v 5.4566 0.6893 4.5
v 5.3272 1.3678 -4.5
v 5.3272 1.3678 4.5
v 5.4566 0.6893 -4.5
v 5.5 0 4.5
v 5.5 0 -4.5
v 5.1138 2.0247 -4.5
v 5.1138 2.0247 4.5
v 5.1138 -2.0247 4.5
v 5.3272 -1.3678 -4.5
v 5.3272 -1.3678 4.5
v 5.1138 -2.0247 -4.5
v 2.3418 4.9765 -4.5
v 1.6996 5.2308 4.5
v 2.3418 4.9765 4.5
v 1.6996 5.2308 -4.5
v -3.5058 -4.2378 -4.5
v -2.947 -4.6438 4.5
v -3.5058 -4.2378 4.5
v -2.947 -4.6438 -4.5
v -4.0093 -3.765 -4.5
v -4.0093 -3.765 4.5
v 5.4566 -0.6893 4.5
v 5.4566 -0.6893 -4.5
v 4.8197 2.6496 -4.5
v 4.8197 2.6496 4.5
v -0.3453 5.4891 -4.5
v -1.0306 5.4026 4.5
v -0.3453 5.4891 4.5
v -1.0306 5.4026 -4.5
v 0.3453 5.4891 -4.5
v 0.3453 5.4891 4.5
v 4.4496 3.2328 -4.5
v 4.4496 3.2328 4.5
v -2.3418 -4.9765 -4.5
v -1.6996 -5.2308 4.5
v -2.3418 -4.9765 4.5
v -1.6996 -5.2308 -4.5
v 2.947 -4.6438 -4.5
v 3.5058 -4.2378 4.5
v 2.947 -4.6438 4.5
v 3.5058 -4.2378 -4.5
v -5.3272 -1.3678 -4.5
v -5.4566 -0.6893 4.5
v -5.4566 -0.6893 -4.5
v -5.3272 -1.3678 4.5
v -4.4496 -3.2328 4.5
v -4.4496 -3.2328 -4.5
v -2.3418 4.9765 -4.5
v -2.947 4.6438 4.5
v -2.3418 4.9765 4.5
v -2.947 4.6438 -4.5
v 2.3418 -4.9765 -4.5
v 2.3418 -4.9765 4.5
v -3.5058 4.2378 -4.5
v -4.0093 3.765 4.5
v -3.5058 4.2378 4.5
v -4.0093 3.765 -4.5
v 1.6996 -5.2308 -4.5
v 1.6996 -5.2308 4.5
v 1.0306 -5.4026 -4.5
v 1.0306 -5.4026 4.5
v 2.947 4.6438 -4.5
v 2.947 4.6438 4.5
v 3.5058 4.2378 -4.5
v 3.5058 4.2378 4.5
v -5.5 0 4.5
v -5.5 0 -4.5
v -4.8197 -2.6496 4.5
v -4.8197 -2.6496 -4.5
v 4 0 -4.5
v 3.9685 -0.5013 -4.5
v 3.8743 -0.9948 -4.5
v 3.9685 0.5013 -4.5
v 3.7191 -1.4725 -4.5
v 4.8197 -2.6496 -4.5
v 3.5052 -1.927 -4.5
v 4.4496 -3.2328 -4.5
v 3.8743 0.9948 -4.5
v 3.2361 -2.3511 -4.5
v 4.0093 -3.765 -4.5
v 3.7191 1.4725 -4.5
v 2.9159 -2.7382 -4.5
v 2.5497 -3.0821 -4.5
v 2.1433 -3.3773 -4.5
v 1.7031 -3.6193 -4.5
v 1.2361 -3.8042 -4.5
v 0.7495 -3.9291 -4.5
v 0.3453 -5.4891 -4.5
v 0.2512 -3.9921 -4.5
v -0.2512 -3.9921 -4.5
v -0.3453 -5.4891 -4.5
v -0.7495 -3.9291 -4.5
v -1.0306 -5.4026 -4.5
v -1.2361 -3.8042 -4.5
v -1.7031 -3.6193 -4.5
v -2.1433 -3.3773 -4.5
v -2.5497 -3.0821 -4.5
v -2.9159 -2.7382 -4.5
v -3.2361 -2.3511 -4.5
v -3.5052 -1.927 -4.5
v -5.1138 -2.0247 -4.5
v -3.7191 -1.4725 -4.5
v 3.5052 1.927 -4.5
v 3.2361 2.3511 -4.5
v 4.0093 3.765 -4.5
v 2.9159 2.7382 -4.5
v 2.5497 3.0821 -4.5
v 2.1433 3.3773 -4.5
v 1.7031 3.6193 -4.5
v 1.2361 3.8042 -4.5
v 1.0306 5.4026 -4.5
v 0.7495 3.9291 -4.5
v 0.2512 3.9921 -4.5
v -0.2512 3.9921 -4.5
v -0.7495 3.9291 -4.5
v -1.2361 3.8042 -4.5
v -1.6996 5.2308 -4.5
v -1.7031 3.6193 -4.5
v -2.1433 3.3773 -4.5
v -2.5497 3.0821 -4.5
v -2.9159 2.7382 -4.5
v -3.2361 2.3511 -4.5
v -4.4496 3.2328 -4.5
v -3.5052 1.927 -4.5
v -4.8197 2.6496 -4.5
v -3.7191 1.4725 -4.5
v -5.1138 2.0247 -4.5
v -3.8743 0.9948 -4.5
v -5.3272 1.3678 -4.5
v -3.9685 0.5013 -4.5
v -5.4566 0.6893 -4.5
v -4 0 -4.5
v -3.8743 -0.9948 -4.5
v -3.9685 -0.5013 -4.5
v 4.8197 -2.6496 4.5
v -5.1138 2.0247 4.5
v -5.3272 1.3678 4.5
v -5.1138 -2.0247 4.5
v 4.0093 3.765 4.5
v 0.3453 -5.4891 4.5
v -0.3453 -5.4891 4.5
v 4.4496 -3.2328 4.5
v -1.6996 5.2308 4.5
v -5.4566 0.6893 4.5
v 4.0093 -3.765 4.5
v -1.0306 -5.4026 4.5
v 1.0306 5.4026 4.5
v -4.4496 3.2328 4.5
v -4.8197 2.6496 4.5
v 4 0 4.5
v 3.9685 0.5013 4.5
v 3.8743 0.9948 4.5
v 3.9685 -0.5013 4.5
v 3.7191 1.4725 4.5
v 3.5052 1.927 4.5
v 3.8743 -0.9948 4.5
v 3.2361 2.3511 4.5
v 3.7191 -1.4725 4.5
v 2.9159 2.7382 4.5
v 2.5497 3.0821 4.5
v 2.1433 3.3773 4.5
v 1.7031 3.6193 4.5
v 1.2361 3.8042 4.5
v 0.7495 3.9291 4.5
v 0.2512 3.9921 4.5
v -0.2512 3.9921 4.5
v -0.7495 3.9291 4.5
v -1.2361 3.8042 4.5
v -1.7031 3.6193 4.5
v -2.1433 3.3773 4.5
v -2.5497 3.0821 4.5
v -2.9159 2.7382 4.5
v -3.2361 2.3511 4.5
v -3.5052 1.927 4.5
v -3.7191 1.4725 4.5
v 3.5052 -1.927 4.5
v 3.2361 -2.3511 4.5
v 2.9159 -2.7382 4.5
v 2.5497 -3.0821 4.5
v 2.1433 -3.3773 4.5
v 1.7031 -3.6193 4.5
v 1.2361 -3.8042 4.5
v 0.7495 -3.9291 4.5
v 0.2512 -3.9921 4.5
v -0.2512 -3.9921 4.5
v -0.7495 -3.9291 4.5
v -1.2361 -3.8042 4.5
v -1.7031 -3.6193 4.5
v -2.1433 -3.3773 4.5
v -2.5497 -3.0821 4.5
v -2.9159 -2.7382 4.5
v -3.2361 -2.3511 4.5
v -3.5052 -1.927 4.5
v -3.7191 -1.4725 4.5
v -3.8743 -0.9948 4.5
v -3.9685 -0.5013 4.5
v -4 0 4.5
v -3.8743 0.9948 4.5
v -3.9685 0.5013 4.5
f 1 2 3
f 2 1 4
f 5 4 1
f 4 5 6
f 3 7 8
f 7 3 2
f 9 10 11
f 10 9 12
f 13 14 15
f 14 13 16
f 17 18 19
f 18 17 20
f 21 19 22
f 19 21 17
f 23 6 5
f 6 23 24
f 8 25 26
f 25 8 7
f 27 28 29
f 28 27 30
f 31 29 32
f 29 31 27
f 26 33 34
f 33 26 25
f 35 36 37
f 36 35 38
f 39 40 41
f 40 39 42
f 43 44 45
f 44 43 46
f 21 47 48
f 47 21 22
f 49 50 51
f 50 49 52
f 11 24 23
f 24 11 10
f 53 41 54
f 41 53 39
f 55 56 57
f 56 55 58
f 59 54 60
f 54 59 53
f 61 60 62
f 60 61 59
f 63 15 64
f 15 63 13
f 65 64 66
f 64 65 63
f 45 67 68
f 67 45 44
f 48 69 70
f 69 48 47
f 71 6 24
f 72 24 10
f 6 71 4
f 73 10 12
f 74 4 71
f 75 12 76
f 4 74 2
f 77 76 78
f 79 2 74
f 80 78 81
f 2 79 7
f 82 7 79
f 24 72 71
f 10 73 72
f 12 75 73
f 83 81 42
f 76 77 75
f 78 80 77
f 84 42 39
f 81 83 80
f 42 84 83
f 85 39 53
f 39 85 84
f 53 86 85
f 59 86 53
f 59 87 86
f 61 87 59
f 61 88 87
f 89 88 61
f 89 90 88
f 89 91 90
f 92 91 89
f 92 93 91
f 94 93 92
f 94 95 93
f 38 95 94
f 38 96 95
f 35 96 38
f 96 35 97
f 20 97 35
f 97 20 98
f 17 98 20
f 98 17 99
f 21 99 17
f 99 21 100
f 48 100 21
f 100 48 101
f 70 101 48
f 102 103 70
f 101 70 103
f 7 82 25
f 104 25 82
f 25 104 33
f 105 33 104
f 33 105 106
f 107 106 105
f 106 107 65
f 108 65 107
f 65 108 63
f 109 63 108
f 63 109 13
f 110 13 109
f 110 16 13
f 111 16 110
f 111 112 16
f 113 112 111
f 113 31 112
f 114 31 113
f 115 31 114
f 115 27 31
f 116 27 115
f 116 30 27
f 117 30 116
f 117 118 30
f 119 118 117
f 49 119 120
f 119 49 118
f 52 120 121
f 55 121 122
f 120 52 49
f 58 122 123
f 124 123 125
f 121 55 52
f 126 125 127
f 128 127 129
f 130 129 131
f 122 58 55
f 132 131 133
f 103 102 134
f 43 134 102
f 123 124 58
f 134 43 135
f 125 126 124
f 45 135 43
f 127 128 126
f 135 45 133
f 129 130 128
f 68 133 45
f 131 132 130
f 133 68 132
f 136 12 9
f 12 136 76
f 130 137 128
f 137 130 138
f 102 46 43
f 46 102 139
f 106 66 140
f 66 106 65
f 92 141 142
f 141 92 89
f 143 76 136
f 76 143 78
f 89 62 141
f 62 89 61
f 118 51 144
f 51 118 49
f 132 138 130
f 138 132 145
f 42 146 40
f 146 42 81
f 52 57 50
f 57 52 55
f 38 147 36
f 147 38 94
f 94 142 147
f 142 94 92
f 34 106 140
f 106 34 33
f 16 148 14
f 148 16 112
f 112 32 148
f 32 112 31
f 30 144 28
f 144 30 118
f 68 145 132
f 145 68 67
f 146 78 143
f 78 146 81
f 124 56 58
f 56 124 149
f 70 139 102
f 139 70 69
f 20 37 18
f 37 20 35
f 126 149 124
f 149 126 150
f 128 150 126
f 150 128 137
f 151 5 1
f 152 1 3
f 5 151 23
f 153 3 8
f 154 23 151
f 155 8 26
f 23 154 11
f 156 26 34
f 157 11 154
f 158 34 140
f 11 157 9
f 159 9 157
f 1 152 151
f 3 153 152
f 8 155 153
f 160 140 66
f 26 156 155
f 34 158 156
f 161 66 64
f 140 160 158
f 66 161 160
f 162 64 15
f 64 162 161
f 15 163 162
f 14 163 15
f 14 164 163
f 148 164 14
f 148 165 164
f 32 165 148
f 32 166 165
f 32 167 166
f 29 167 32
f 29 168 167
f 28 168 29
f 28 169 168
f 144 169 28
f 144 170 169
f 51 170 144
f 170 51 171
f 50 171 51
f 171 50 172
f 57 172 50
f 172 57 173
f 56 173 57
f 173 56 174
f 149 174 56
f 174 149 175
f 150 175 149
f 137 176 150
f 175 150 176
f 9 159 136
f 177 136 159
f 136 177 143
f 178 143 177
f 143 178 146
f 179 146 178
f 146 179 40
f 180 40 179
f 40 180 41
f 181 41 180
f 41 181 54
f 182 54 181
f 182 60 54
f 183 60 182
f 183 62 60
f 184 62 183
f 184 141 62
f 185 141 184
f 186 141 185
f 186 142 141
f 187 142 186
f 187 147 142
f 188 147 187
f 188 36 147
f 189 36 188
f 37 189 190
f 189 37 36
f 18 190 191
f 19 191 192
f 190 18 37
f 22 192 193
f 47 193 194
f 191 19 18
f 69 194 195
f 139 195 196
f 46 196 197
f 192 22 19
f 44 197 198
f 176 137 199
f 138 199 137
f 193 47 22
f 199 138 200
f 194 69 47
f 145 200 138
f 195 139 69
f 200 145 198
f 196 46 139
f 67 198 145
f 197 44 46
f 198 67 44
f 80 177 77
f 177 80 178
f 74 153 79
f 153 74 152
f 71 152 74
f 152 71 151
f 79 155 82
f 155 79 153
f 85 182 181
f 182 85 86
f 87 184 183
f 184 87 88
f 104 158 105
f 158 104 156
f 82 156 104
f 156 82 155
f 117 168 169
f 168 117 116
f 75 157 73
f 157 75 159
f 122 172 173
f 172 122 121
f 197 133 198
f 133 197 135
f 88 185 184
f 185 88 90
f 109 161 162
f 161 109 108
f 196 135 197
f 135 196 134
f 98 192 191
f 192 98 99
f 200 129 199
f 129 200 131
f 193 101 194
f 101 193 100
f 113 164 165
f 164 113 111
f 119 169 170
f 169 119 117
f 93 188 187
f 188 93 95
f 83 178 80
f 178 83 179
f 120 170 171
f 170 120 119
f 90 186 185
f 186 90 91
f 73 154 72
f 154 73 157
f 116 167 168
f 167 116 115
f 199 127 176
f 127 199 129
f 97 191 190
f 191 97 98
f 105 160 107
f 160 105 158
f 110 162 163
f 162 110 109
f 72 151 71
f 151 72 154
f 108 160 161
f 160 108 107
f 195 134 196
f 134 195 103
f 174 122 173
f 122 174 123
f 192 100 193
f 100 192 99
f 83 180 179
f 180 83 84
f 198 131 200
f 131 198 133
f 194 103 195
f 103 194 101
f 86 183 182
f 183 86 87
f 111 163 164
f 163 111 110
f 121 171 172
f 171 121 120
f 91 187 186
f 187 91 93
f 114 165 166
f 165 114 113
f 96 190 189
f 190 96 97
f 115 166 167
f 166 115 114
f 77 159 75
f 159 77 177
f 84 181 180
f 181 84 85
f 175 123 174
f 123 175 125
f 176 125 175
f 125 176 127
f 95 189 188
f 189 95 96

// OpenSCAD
$fn = 50;


difference() {
	union() {
		translate(v = [0, 0, -4.5000000000]) {
			cylinder(h = 9, r = 5.5000000000);
		}
	}
	union() {
		translate(v = [0, 0, -100.0000000000]) {
			cylinder(h = 200, r = 4.0000000000);
		}
	}
}
